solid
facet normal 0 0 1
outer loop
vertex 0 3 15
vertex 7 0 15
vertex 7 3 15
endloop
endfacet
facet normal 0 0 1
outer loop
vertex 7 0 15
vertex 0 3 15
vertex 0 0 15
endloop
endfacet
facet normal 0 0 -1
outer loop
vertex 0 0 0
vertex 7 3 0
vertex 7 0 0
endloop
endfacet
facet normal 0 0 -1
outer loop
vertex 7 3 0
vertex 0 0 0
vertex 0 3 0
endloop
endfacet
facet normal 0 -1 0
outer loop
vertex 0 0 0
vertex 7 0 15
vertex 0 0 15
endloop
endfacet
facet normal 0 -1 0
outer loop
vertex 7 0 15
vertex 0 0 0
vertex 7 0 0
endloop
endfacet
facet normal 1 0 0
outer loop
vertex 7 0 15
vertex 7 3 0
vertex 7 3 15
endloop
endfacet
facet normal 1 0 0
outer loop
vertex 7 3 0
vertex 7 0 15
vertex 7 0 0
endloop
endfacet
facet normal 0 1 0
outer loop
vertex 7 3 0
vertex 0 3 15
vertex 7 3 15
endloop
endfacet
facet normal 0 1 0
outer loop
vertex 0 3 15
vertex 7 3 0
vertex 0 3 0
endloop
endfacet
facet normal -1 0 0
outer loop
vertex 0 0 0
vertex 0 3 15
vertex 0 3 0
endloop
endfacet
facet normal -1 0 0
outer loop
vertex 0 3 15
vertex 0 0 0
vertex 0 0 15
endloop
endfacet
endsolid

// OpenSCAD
// Generated by SolidPython 1.0.1 on 2020-07-29 00:46:54


cube(size = [7, 3, 15]);
/***********************************************
*********      SolidPython code:      **********
************************************************
 
# import packages: SolidPython
from solid import *
from solid.utils import *
from itertools import chain, combinations, permutations


class Resize:

    def __init__(self, scad_file):
        self.scad_file = scad_file
        #self.scad_file = import_scad(scad_file)
        # cone/cylinder param:
        self.r1 = 0
        self.r2 = 0
        self.h = 0
        # rectangular prism param:
        self.w = 0
        self.l = 0
        # ellipse param:
        self.r = 0

    # import OpenScad code (file name corresponds to shape)


    # classify shape + parameters
    def assign(self, param1, param2, param3):
        if self.scad_file == 'cone.scad':
            self.r1 = param1
            self.r2 = param2
            self.h = param3
        elif self.scad_file == 'cylinder.scad':
            self.r1 = param1
            self.r2 = param2
            self.h = param3
        elif self.scad_file == 'rectangularPrism.scad':
            self.h = param1
            self.l = param2
            self.w = param3
        else:
            self.r = param1
            self.h = param2

    # resize parameters
    def iterate(self):
        x = range(3, 20, 2)
        i = 1
        if self.scad_file == 'cone.scad':
            tempList = list(permutations(x, 2))
            for temp in tempList:
                param1 = temp[0]
                param2 = temp[1]
                filepath = 'produced_scad_files/' + 'cone' + str(param1) + '_' + str(param2) + '_' + '.scad'
                scad_render_to_file(cylinder(h=param1, r1=param2, r2=0), filepath)

        elif self.scad_file == 'cylinder.scad':
            tempList = list(permutations(x, 3))
            for temp in tempList:
                param1 = temp[0]
                param2 = temp[1]
                filepath = 'produced_scad_files/' + 'cylinder' + str(param1) + '_' + str(param2) + '_' + '.scad'
                scad_render_to_file(cylinder(h=param1, r1=param2, r2=param2), filepath)

        elif self.scad_file == 'rectangularPrism.scad':
            tempList = list(permutations(x, 3))
            for temp in tempList:
                param1 = temp[0]
                param2 = temp[1]
                param3 = temp[2]
                filepath = 'produced_scad_files/' + 'rectangularPrism' + str(param1) + '_' + str(param2) + '_' + str(
                    param3) + '.scad'
                scad_render_to_file(cube(size=(param1, param2, param3)), filepath)

        elif self.scad_file == 'ellipse.scad':
            tempList = list(permutations(x, 4))
            for temp in tempList:
                param1 = temp[0]
                param2 = temp[1]
                param3 = temp[2]
                param4 = temp[3]
                filepath = 'produced_scad_files/' + 'ellipse' + str(param1) + '_' + str(param2) + '_' + str(param3) + '_' + str(param4) + '.scad'
                scad_render_to_file(scale([param1, param2, param3])(sphere(r=param4)), filepath)

    def render_to_scadfile(self):
        scad_render_to_file(scad, 'example.scad') 
 
************************************************/
